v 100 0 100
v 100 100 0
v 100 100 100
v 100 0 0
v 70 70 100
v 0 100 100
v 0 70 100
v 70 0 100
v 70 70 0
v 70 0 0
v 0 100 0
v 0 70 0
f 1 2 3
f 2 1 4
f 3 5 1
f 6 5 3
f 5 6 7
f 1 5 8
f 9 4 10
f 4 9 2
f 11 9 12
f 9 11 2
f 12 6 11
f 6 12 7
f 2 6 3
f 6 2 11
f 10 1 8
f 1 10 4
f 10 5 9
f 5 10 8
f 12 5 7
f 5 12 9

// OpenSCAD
$fn=40;

totalW=100;
totalH=100;


difference(){
	cube([totalW, totalW, totalH]);
	cube([totalW*0.70, totalW*0.70, totalH*1.2]);
}
